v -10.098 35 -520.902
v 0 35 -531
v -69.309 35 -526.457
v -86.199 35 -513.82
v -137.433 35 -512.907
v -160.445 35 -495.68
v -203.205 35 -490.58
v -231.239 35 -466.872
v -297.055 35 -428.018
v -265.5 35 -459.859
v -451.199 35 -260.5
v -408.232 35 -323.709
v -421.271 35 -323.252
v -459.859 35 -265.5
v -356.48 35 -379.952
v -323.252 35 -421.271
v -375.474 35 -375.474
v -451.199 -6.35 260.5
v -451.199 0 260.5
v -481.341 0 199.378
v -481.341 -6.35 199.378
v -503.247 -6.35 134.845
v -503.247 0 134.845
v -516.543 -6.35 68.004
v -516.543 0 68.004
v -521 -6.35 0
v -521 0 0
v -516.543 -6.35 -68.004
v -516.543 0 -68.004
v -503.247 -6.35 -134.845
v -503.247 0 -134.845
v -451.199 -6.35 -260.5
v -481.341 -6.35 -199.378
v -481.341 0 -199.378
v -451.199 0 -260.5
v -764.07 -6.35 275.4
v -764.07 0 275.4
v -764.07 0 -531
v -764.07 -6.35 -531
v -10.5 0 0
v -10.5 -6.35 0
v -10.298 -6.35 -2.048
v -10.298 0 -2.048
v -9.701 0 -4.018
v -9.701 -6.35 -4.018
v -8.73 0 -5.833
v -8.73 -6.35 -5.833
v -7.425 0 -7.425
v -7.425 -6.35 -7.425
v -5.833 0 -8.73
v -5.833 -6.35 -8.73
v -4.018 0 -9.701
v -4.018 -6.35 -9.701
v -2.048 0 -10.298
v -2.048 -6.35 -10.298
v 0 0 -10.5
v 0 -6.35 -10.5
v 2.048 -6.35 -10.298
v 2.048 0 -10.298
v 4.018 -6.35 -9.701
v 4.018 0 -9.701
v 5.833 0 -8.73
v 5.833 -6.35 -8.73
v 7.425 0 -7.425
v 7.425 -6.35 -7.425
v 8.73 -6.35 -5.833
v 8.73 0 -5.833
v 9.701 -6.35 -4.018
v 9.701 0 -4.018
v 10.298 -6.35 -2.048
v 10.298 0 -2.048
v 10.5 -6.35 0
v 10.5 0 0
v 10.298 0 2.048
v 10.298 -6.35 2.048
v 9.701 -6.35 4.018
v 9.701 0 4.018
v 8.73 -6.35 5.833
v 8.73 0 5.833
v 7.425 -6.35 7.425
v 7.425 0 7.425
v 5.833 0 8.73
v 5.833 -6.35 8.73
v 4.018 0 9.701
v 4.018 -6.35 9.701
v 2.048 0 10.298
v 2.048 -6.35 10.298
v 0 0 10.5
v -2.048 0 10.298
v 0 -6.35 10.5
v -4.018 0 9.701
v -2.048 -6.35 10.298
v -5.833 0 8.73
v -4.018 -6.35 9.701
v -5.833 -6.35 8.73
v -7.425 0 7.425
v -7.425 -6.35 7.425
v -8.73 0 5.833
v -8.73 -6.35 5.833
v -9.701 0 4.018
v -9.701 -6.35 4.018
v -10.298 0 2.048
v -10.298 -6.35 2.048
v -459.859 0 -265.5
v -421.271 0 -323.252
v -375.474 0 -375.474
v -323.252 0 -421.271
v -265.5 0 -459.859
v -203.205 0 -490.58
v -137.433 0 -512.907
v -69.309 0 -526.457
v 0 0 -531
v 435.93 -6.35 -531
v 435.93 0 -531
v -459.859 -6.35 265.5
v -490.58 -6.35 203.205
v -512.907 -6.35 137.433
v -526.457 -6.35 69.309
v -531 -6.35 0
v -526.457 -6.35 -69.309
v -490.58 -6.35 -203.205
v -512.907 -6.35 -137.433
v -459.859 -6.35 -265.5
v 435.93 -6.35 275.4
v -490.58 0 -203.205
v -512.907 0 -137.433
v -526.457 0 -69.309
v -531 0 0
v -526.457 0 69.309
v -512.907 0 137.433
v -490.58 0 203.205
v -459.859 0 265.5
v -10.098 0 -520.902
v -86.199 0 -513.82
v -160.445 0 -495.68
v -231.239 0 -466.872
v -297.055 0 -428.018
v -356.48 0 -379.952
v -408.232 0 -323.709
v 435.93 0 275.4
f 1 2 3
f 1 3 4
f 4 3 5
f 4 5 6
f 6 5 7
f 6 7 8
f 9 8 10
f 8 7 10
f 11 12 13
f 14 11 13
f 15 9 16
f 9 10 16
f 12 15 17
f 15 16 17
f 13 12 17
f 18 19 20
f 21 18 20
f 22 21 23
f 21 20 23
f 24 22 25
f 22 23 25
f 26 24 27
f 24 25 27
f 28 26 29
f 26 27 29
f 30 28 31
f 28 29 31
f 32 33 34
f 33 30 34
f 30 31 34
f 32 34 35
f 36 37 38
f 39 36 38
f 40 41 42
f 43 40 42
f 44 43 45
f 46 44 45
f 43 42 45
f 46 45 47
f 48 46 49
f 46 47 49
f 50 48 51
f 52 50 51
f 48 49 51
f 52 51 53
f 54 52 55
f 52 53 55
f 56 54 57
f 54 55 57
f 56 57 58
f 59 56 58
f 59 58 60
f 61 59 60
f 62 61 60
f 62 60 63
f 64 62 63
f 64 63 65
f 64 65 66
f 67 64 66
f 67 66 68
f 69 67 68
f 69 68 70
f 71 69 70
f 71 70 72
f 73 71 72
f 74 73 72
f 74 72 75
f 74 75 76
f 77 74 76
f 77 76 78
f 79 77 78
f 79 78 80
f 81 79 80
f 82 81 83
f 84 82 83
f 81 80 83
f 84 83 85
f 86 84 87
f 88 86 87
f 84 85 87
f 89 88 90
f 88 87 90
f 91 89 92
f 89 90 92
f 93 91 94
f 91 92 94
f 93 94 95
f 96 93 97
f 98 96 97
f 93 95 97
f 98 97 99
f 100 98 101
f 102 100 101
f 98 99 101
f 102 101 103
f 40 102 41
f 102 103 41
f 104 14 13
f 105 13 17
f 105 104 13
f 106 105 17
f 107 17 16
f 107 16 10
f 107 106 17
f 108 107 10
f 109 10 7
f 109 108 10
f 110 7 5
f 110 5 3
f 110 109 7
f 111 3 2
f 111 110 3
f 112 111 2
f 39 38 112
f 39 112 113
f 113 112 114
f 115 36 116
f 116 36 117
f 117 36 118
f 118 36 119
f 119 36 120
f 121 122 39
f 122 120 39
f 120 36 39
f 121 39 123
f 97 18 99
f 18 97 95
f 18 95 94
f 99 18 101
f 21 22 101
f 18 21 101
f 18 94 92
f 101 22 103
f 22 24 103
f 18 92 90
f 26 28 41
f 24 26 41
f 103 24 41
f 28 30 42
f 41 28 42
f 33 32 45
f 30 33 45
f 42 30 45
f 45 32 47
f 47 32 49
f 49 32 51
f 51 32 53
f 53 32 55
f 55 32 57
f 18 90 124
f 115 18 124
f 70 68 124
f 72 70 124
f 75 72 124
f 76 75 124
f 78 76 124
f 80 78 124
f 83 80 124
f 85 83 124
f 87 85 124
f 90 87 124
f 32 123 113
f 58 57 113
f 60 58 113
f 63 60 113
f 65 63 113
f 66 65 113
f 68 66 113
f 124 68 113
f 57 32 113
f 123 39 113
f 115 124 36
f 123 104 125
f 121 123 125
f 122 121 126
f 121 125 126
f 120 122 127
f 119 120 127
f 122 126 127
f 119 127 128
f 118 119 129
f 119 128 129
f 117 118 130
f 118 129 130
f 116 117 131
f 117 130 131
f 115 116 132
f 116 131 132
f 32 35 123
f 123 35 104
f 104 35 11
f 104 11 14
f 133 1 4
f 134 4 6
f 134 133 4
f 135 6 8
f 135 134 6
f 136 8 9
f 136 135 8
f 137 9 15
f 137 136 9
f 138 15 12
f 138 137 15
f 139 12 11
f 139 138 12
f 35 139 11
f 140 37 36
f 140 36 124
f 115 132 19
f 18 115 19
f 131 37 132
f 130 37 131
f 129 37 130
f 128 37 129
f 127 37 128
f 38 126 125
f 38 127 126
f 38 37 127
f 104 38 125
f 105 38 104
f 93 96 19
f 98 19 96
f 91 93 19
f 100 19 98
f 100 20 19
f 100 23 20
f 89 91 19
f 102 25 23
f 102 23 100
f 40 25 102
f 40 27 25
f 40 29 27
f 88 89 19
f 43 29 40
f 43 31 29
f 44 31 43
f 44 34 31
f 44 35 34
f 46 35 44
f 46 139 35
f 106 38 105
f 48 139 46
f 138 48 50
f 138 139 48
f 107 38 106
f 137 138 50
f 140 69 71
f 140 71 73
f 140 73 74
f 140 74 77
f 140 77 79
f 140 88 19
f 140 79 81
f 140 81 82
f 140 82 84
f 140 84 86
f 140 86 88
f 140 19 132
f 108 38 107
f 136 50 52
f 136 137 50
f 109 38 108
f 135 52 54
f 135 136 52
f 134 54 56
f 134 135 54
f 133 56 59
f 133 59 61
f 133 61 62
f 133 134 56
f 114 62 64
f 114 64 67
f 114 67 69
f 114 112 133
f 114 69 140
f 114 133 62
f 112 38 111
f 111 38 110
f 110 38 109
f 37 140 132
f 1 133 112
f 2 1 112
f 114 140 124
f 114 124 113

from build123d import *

# Parameters (mm, degrees)
BOSS_EXTRUDE1_DEPTH    = 35
SKETCH4_W              = 1200
SKETCH4_H              = 806.4
BOSS_EXTRUDE2_DEPTH    = 6.35
CHAMFER1_SIZE          = 10
F_20_0MM_DOWEL_HOLE1_D = 21
CUT_EXTRUDE1_DEPTH     = 932.12242208


with BuildPart() as part:
    # Sketch3 → Boss-Extrude1 (new body)
    with BuildSketch(Plane(origin=(0, 0, 0), x_dir=(1, 0, 0), z_dir=(0, 1, 0))):
        with BuildLine():
            Line((0, 531), (0, 521))
            ThreePointArc((0, 521), (-260.5, 451.199235372), (-451.199235372, 260.5))
            Line((-451.199235372, 260.5), (-459.85948941, 265.5))
            ThreePointArc((-459.85948941, 265.5), (-265.5, 459.85948941), (0, 531))
        make_face()
    extrude(amount=BOSS_EXTRUDE1_DEPTH)

    # Sketch4 → Boss-Extrude2 (add)
    with BuildSketch(Plane(origin=(0, 0, 0), x_dir=(1, 0, 0), z_dir=(0, 1, 0))):
        with Locations((-164.07, 127.8)):
            Rectangle(SKETCH4_W, SKETCH4_H)
    extrude(amount=-BOSS_EXTRUDE2_DEPTH)

    # Chamfer1
    # the kernel refuses this chamfer: 10 mm, written as the material it takes off along each edge
    with BuildSketch(Plane(origin=(0, 0, -521), x_dir=(-0.999953038196086, 0, 0.009691305506332204), z_dir=(0, 1, 0))) as chamfer1_piece_1:
        with BuildLine():
            Line((10.098340338, 0), (-CHAMFER1_SIZE * 0.00969130550632, -CHAMFER1_SIZE * 0.999953038196))
            Line((-CHAMFER1_SIZE * 0.00969130550632, -CHAMFER1_SIZE * 0.999953038196), (0, 0))
            ThreePointArc((0, 0), (5.192000536, -0.024447522), (10.098340338, 0))
        make_face()
    extrude(amount=60.969219121, mode=Mode.SUBTRACT)

    # Ø20.0mm Dowel Hole1 (through all)
    with Locations(Plane(origin=(0, 0, 0), x_dir=(1, 0, 0), z_dir=(0, 1, 0))):
        with Locations((0, 0)):
            Hole(F_20_0MM_DOWEL_HOLE1_D / 2)

    # Sketch8 → Cut-Extrude1 (cut, through all)
    with BuildSketch(Plane(origin=(0, 0, 0), x_dir=(1, 0, 0), z_dir=(0, 1, 0))):
        with BuildLine():
            Line((-451.199235372, 260.5), (-459.85948941, 265.5))
            ThreePointArc((-459.85948941, 265.5), (-531, 0), (-459.85948941, -265.5))
            Line((-459.85948941, -265.5), (-451.199235372, -260.5))
            ThreePointArc((-451.199235372, -260.5), (-521, 0), (-451.199235372, 260.5))
        make_face()
    extrude(amount=-CUT_EXTRUDE1_DEPTH, mode=Mode.SUBTRACT)


solid = part.part
